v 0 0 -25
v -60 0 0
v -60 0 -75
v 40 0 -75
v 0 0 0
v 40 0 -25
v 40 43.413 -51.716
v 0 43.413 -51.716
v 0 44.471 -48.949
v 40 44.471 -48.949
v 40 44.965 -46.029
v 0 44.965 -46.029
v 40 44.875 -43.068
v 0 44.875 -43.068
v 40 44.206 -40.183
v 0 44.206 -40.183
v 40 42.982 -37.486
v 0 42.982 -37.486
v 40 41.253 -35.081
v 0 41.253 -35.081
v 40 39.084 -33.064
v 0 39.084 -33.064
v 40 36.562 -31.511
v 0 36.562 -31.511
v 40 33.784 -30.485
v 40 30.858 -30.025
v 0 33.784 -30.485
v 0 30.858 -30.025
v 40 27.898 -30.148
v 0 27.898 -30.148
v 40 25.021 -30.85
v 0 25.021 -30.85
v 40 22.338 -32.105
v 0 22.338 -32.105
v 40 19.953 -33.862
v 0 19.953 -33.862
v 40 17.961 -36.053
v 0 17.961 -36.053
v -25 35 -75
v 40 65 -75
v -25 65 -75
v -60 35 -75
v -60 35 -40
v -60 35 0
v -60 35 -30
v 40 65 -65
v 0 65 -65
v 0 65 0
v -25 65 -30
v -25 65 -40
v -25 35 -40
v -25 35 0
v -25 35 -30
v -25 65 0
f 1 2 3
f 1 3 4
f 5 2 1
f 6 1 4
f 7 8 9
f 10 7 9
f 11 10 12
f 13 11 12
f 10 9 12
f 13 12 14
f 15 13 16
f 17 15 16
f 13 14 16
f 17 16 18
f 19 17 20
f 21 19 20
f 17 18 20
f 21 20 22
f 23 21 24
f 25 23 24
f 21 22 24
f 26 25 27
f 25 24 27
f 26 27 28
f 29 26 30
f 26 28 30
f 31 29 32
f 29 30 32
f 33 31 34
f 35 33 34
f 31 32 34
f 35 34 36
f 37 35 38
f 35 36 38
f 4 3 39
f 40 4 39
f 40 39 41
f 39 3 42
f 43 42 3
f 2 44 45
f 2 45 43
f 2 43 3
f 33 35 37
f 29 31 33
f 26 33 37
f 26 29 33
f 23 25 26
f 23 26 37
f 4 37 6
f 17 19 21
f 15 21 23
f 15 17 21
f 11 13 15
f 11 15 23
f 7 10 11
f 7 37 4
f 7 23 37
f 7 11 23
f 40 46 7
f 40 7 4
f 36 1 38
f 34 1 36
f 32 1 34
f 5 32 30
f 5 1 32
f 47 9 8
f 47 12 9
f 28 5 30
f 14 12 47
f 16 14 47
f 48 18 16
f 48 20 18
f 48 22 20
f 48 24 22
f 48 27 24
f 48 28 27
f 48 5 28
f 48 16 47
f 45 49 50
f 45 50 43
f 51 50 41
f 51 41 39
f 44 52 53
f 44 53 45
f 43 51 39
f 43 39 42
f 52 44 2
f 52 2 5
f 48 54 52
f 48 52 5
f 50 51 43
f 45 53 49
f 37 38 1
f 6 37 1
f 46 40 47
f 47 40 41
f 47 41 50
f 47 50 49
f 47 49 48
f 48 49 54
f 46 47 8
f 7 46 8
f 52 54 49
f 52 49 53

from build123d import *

# Parameters (mm, degrees)
RESSALTO_EXTRUS_O1_DEPTH = 75
RESSALTO_EXTRUS_O2_DEPTH = 40
ESBO_O4_W                = 10
ESBO_O4_H                = 30
RESSALTO_EXTRUS_O3_DEPTH = 35
CORTE_EXTRUS_O1_REACH    = 101.247


with BuildPart() as part:
    # Esboço2 → Ressalto-extrusão1 (new body)
    with BuildSketch(Plane.XY):
        Polygon((-60, 35), (-60, 0), (0, 0), (0, 65), (-25, 65), (-25, 35), align=None)
    extrude(amount=-RESSALTO_EXTRUS_O1_DEPTH)

    # Esboço3 → Ressalto-extrusão2 (add)
    with BuildSketch(Plane(origin=(0, 0, 0), x_dir=(0, 0, -1), z_dir=(1, 0, 0))):
        with BuildLine():
            Line((65, 65), (51.71553286, 43.412740898))
            ThreePointArc((51.71553286, 43.412740898), (32.225125249, 37.861461385), (36.052707483, 17.96064966))
            Line((36.052707483, 17.96064966), (25, 0))
            Line((25, 0), (75, 0))
            Line((75, 0), (75, 65))
            Line((75, 65), (65, 65))
        make_face()
    extrude(amount=RESSALTO_EXTRUS_O2_DEPTH)

    # Esboço4 → Ressalto-extrusão3 (add)
    with BuildSketch(Plane.ZY.offset(25)):
        with Locations((-35, 50)):
            Rectangle(ESBO_O4_W, ESBO_O4_H)
    extrude(amount=RESSALTO_EXTRUS_O3_DEPTH)

    # Esboço6 → Corte-extrusão1 (cut, up to next)
    with BuildSketch(Plane.XY.offset(-30), mode=Mode.PRIVATE) as corte_extrus_o1_sk1:
        Polygon((-25, 65), (-60, 35), (-60, 65), align=None)
    corte_extrus_o1_tool1 = extrude(corte_extrus_o1_sk1.sketch, amount=-CORTE_EXTRUS_O1_REACH, mode=Mode.PRIVATE) & part.part
    add(corte_extrus_o1_tool1.solids().sort_by_distance((-48.333333, 55, -30))[0], mode=Mode.SUBTRACT)


solid = part.part
